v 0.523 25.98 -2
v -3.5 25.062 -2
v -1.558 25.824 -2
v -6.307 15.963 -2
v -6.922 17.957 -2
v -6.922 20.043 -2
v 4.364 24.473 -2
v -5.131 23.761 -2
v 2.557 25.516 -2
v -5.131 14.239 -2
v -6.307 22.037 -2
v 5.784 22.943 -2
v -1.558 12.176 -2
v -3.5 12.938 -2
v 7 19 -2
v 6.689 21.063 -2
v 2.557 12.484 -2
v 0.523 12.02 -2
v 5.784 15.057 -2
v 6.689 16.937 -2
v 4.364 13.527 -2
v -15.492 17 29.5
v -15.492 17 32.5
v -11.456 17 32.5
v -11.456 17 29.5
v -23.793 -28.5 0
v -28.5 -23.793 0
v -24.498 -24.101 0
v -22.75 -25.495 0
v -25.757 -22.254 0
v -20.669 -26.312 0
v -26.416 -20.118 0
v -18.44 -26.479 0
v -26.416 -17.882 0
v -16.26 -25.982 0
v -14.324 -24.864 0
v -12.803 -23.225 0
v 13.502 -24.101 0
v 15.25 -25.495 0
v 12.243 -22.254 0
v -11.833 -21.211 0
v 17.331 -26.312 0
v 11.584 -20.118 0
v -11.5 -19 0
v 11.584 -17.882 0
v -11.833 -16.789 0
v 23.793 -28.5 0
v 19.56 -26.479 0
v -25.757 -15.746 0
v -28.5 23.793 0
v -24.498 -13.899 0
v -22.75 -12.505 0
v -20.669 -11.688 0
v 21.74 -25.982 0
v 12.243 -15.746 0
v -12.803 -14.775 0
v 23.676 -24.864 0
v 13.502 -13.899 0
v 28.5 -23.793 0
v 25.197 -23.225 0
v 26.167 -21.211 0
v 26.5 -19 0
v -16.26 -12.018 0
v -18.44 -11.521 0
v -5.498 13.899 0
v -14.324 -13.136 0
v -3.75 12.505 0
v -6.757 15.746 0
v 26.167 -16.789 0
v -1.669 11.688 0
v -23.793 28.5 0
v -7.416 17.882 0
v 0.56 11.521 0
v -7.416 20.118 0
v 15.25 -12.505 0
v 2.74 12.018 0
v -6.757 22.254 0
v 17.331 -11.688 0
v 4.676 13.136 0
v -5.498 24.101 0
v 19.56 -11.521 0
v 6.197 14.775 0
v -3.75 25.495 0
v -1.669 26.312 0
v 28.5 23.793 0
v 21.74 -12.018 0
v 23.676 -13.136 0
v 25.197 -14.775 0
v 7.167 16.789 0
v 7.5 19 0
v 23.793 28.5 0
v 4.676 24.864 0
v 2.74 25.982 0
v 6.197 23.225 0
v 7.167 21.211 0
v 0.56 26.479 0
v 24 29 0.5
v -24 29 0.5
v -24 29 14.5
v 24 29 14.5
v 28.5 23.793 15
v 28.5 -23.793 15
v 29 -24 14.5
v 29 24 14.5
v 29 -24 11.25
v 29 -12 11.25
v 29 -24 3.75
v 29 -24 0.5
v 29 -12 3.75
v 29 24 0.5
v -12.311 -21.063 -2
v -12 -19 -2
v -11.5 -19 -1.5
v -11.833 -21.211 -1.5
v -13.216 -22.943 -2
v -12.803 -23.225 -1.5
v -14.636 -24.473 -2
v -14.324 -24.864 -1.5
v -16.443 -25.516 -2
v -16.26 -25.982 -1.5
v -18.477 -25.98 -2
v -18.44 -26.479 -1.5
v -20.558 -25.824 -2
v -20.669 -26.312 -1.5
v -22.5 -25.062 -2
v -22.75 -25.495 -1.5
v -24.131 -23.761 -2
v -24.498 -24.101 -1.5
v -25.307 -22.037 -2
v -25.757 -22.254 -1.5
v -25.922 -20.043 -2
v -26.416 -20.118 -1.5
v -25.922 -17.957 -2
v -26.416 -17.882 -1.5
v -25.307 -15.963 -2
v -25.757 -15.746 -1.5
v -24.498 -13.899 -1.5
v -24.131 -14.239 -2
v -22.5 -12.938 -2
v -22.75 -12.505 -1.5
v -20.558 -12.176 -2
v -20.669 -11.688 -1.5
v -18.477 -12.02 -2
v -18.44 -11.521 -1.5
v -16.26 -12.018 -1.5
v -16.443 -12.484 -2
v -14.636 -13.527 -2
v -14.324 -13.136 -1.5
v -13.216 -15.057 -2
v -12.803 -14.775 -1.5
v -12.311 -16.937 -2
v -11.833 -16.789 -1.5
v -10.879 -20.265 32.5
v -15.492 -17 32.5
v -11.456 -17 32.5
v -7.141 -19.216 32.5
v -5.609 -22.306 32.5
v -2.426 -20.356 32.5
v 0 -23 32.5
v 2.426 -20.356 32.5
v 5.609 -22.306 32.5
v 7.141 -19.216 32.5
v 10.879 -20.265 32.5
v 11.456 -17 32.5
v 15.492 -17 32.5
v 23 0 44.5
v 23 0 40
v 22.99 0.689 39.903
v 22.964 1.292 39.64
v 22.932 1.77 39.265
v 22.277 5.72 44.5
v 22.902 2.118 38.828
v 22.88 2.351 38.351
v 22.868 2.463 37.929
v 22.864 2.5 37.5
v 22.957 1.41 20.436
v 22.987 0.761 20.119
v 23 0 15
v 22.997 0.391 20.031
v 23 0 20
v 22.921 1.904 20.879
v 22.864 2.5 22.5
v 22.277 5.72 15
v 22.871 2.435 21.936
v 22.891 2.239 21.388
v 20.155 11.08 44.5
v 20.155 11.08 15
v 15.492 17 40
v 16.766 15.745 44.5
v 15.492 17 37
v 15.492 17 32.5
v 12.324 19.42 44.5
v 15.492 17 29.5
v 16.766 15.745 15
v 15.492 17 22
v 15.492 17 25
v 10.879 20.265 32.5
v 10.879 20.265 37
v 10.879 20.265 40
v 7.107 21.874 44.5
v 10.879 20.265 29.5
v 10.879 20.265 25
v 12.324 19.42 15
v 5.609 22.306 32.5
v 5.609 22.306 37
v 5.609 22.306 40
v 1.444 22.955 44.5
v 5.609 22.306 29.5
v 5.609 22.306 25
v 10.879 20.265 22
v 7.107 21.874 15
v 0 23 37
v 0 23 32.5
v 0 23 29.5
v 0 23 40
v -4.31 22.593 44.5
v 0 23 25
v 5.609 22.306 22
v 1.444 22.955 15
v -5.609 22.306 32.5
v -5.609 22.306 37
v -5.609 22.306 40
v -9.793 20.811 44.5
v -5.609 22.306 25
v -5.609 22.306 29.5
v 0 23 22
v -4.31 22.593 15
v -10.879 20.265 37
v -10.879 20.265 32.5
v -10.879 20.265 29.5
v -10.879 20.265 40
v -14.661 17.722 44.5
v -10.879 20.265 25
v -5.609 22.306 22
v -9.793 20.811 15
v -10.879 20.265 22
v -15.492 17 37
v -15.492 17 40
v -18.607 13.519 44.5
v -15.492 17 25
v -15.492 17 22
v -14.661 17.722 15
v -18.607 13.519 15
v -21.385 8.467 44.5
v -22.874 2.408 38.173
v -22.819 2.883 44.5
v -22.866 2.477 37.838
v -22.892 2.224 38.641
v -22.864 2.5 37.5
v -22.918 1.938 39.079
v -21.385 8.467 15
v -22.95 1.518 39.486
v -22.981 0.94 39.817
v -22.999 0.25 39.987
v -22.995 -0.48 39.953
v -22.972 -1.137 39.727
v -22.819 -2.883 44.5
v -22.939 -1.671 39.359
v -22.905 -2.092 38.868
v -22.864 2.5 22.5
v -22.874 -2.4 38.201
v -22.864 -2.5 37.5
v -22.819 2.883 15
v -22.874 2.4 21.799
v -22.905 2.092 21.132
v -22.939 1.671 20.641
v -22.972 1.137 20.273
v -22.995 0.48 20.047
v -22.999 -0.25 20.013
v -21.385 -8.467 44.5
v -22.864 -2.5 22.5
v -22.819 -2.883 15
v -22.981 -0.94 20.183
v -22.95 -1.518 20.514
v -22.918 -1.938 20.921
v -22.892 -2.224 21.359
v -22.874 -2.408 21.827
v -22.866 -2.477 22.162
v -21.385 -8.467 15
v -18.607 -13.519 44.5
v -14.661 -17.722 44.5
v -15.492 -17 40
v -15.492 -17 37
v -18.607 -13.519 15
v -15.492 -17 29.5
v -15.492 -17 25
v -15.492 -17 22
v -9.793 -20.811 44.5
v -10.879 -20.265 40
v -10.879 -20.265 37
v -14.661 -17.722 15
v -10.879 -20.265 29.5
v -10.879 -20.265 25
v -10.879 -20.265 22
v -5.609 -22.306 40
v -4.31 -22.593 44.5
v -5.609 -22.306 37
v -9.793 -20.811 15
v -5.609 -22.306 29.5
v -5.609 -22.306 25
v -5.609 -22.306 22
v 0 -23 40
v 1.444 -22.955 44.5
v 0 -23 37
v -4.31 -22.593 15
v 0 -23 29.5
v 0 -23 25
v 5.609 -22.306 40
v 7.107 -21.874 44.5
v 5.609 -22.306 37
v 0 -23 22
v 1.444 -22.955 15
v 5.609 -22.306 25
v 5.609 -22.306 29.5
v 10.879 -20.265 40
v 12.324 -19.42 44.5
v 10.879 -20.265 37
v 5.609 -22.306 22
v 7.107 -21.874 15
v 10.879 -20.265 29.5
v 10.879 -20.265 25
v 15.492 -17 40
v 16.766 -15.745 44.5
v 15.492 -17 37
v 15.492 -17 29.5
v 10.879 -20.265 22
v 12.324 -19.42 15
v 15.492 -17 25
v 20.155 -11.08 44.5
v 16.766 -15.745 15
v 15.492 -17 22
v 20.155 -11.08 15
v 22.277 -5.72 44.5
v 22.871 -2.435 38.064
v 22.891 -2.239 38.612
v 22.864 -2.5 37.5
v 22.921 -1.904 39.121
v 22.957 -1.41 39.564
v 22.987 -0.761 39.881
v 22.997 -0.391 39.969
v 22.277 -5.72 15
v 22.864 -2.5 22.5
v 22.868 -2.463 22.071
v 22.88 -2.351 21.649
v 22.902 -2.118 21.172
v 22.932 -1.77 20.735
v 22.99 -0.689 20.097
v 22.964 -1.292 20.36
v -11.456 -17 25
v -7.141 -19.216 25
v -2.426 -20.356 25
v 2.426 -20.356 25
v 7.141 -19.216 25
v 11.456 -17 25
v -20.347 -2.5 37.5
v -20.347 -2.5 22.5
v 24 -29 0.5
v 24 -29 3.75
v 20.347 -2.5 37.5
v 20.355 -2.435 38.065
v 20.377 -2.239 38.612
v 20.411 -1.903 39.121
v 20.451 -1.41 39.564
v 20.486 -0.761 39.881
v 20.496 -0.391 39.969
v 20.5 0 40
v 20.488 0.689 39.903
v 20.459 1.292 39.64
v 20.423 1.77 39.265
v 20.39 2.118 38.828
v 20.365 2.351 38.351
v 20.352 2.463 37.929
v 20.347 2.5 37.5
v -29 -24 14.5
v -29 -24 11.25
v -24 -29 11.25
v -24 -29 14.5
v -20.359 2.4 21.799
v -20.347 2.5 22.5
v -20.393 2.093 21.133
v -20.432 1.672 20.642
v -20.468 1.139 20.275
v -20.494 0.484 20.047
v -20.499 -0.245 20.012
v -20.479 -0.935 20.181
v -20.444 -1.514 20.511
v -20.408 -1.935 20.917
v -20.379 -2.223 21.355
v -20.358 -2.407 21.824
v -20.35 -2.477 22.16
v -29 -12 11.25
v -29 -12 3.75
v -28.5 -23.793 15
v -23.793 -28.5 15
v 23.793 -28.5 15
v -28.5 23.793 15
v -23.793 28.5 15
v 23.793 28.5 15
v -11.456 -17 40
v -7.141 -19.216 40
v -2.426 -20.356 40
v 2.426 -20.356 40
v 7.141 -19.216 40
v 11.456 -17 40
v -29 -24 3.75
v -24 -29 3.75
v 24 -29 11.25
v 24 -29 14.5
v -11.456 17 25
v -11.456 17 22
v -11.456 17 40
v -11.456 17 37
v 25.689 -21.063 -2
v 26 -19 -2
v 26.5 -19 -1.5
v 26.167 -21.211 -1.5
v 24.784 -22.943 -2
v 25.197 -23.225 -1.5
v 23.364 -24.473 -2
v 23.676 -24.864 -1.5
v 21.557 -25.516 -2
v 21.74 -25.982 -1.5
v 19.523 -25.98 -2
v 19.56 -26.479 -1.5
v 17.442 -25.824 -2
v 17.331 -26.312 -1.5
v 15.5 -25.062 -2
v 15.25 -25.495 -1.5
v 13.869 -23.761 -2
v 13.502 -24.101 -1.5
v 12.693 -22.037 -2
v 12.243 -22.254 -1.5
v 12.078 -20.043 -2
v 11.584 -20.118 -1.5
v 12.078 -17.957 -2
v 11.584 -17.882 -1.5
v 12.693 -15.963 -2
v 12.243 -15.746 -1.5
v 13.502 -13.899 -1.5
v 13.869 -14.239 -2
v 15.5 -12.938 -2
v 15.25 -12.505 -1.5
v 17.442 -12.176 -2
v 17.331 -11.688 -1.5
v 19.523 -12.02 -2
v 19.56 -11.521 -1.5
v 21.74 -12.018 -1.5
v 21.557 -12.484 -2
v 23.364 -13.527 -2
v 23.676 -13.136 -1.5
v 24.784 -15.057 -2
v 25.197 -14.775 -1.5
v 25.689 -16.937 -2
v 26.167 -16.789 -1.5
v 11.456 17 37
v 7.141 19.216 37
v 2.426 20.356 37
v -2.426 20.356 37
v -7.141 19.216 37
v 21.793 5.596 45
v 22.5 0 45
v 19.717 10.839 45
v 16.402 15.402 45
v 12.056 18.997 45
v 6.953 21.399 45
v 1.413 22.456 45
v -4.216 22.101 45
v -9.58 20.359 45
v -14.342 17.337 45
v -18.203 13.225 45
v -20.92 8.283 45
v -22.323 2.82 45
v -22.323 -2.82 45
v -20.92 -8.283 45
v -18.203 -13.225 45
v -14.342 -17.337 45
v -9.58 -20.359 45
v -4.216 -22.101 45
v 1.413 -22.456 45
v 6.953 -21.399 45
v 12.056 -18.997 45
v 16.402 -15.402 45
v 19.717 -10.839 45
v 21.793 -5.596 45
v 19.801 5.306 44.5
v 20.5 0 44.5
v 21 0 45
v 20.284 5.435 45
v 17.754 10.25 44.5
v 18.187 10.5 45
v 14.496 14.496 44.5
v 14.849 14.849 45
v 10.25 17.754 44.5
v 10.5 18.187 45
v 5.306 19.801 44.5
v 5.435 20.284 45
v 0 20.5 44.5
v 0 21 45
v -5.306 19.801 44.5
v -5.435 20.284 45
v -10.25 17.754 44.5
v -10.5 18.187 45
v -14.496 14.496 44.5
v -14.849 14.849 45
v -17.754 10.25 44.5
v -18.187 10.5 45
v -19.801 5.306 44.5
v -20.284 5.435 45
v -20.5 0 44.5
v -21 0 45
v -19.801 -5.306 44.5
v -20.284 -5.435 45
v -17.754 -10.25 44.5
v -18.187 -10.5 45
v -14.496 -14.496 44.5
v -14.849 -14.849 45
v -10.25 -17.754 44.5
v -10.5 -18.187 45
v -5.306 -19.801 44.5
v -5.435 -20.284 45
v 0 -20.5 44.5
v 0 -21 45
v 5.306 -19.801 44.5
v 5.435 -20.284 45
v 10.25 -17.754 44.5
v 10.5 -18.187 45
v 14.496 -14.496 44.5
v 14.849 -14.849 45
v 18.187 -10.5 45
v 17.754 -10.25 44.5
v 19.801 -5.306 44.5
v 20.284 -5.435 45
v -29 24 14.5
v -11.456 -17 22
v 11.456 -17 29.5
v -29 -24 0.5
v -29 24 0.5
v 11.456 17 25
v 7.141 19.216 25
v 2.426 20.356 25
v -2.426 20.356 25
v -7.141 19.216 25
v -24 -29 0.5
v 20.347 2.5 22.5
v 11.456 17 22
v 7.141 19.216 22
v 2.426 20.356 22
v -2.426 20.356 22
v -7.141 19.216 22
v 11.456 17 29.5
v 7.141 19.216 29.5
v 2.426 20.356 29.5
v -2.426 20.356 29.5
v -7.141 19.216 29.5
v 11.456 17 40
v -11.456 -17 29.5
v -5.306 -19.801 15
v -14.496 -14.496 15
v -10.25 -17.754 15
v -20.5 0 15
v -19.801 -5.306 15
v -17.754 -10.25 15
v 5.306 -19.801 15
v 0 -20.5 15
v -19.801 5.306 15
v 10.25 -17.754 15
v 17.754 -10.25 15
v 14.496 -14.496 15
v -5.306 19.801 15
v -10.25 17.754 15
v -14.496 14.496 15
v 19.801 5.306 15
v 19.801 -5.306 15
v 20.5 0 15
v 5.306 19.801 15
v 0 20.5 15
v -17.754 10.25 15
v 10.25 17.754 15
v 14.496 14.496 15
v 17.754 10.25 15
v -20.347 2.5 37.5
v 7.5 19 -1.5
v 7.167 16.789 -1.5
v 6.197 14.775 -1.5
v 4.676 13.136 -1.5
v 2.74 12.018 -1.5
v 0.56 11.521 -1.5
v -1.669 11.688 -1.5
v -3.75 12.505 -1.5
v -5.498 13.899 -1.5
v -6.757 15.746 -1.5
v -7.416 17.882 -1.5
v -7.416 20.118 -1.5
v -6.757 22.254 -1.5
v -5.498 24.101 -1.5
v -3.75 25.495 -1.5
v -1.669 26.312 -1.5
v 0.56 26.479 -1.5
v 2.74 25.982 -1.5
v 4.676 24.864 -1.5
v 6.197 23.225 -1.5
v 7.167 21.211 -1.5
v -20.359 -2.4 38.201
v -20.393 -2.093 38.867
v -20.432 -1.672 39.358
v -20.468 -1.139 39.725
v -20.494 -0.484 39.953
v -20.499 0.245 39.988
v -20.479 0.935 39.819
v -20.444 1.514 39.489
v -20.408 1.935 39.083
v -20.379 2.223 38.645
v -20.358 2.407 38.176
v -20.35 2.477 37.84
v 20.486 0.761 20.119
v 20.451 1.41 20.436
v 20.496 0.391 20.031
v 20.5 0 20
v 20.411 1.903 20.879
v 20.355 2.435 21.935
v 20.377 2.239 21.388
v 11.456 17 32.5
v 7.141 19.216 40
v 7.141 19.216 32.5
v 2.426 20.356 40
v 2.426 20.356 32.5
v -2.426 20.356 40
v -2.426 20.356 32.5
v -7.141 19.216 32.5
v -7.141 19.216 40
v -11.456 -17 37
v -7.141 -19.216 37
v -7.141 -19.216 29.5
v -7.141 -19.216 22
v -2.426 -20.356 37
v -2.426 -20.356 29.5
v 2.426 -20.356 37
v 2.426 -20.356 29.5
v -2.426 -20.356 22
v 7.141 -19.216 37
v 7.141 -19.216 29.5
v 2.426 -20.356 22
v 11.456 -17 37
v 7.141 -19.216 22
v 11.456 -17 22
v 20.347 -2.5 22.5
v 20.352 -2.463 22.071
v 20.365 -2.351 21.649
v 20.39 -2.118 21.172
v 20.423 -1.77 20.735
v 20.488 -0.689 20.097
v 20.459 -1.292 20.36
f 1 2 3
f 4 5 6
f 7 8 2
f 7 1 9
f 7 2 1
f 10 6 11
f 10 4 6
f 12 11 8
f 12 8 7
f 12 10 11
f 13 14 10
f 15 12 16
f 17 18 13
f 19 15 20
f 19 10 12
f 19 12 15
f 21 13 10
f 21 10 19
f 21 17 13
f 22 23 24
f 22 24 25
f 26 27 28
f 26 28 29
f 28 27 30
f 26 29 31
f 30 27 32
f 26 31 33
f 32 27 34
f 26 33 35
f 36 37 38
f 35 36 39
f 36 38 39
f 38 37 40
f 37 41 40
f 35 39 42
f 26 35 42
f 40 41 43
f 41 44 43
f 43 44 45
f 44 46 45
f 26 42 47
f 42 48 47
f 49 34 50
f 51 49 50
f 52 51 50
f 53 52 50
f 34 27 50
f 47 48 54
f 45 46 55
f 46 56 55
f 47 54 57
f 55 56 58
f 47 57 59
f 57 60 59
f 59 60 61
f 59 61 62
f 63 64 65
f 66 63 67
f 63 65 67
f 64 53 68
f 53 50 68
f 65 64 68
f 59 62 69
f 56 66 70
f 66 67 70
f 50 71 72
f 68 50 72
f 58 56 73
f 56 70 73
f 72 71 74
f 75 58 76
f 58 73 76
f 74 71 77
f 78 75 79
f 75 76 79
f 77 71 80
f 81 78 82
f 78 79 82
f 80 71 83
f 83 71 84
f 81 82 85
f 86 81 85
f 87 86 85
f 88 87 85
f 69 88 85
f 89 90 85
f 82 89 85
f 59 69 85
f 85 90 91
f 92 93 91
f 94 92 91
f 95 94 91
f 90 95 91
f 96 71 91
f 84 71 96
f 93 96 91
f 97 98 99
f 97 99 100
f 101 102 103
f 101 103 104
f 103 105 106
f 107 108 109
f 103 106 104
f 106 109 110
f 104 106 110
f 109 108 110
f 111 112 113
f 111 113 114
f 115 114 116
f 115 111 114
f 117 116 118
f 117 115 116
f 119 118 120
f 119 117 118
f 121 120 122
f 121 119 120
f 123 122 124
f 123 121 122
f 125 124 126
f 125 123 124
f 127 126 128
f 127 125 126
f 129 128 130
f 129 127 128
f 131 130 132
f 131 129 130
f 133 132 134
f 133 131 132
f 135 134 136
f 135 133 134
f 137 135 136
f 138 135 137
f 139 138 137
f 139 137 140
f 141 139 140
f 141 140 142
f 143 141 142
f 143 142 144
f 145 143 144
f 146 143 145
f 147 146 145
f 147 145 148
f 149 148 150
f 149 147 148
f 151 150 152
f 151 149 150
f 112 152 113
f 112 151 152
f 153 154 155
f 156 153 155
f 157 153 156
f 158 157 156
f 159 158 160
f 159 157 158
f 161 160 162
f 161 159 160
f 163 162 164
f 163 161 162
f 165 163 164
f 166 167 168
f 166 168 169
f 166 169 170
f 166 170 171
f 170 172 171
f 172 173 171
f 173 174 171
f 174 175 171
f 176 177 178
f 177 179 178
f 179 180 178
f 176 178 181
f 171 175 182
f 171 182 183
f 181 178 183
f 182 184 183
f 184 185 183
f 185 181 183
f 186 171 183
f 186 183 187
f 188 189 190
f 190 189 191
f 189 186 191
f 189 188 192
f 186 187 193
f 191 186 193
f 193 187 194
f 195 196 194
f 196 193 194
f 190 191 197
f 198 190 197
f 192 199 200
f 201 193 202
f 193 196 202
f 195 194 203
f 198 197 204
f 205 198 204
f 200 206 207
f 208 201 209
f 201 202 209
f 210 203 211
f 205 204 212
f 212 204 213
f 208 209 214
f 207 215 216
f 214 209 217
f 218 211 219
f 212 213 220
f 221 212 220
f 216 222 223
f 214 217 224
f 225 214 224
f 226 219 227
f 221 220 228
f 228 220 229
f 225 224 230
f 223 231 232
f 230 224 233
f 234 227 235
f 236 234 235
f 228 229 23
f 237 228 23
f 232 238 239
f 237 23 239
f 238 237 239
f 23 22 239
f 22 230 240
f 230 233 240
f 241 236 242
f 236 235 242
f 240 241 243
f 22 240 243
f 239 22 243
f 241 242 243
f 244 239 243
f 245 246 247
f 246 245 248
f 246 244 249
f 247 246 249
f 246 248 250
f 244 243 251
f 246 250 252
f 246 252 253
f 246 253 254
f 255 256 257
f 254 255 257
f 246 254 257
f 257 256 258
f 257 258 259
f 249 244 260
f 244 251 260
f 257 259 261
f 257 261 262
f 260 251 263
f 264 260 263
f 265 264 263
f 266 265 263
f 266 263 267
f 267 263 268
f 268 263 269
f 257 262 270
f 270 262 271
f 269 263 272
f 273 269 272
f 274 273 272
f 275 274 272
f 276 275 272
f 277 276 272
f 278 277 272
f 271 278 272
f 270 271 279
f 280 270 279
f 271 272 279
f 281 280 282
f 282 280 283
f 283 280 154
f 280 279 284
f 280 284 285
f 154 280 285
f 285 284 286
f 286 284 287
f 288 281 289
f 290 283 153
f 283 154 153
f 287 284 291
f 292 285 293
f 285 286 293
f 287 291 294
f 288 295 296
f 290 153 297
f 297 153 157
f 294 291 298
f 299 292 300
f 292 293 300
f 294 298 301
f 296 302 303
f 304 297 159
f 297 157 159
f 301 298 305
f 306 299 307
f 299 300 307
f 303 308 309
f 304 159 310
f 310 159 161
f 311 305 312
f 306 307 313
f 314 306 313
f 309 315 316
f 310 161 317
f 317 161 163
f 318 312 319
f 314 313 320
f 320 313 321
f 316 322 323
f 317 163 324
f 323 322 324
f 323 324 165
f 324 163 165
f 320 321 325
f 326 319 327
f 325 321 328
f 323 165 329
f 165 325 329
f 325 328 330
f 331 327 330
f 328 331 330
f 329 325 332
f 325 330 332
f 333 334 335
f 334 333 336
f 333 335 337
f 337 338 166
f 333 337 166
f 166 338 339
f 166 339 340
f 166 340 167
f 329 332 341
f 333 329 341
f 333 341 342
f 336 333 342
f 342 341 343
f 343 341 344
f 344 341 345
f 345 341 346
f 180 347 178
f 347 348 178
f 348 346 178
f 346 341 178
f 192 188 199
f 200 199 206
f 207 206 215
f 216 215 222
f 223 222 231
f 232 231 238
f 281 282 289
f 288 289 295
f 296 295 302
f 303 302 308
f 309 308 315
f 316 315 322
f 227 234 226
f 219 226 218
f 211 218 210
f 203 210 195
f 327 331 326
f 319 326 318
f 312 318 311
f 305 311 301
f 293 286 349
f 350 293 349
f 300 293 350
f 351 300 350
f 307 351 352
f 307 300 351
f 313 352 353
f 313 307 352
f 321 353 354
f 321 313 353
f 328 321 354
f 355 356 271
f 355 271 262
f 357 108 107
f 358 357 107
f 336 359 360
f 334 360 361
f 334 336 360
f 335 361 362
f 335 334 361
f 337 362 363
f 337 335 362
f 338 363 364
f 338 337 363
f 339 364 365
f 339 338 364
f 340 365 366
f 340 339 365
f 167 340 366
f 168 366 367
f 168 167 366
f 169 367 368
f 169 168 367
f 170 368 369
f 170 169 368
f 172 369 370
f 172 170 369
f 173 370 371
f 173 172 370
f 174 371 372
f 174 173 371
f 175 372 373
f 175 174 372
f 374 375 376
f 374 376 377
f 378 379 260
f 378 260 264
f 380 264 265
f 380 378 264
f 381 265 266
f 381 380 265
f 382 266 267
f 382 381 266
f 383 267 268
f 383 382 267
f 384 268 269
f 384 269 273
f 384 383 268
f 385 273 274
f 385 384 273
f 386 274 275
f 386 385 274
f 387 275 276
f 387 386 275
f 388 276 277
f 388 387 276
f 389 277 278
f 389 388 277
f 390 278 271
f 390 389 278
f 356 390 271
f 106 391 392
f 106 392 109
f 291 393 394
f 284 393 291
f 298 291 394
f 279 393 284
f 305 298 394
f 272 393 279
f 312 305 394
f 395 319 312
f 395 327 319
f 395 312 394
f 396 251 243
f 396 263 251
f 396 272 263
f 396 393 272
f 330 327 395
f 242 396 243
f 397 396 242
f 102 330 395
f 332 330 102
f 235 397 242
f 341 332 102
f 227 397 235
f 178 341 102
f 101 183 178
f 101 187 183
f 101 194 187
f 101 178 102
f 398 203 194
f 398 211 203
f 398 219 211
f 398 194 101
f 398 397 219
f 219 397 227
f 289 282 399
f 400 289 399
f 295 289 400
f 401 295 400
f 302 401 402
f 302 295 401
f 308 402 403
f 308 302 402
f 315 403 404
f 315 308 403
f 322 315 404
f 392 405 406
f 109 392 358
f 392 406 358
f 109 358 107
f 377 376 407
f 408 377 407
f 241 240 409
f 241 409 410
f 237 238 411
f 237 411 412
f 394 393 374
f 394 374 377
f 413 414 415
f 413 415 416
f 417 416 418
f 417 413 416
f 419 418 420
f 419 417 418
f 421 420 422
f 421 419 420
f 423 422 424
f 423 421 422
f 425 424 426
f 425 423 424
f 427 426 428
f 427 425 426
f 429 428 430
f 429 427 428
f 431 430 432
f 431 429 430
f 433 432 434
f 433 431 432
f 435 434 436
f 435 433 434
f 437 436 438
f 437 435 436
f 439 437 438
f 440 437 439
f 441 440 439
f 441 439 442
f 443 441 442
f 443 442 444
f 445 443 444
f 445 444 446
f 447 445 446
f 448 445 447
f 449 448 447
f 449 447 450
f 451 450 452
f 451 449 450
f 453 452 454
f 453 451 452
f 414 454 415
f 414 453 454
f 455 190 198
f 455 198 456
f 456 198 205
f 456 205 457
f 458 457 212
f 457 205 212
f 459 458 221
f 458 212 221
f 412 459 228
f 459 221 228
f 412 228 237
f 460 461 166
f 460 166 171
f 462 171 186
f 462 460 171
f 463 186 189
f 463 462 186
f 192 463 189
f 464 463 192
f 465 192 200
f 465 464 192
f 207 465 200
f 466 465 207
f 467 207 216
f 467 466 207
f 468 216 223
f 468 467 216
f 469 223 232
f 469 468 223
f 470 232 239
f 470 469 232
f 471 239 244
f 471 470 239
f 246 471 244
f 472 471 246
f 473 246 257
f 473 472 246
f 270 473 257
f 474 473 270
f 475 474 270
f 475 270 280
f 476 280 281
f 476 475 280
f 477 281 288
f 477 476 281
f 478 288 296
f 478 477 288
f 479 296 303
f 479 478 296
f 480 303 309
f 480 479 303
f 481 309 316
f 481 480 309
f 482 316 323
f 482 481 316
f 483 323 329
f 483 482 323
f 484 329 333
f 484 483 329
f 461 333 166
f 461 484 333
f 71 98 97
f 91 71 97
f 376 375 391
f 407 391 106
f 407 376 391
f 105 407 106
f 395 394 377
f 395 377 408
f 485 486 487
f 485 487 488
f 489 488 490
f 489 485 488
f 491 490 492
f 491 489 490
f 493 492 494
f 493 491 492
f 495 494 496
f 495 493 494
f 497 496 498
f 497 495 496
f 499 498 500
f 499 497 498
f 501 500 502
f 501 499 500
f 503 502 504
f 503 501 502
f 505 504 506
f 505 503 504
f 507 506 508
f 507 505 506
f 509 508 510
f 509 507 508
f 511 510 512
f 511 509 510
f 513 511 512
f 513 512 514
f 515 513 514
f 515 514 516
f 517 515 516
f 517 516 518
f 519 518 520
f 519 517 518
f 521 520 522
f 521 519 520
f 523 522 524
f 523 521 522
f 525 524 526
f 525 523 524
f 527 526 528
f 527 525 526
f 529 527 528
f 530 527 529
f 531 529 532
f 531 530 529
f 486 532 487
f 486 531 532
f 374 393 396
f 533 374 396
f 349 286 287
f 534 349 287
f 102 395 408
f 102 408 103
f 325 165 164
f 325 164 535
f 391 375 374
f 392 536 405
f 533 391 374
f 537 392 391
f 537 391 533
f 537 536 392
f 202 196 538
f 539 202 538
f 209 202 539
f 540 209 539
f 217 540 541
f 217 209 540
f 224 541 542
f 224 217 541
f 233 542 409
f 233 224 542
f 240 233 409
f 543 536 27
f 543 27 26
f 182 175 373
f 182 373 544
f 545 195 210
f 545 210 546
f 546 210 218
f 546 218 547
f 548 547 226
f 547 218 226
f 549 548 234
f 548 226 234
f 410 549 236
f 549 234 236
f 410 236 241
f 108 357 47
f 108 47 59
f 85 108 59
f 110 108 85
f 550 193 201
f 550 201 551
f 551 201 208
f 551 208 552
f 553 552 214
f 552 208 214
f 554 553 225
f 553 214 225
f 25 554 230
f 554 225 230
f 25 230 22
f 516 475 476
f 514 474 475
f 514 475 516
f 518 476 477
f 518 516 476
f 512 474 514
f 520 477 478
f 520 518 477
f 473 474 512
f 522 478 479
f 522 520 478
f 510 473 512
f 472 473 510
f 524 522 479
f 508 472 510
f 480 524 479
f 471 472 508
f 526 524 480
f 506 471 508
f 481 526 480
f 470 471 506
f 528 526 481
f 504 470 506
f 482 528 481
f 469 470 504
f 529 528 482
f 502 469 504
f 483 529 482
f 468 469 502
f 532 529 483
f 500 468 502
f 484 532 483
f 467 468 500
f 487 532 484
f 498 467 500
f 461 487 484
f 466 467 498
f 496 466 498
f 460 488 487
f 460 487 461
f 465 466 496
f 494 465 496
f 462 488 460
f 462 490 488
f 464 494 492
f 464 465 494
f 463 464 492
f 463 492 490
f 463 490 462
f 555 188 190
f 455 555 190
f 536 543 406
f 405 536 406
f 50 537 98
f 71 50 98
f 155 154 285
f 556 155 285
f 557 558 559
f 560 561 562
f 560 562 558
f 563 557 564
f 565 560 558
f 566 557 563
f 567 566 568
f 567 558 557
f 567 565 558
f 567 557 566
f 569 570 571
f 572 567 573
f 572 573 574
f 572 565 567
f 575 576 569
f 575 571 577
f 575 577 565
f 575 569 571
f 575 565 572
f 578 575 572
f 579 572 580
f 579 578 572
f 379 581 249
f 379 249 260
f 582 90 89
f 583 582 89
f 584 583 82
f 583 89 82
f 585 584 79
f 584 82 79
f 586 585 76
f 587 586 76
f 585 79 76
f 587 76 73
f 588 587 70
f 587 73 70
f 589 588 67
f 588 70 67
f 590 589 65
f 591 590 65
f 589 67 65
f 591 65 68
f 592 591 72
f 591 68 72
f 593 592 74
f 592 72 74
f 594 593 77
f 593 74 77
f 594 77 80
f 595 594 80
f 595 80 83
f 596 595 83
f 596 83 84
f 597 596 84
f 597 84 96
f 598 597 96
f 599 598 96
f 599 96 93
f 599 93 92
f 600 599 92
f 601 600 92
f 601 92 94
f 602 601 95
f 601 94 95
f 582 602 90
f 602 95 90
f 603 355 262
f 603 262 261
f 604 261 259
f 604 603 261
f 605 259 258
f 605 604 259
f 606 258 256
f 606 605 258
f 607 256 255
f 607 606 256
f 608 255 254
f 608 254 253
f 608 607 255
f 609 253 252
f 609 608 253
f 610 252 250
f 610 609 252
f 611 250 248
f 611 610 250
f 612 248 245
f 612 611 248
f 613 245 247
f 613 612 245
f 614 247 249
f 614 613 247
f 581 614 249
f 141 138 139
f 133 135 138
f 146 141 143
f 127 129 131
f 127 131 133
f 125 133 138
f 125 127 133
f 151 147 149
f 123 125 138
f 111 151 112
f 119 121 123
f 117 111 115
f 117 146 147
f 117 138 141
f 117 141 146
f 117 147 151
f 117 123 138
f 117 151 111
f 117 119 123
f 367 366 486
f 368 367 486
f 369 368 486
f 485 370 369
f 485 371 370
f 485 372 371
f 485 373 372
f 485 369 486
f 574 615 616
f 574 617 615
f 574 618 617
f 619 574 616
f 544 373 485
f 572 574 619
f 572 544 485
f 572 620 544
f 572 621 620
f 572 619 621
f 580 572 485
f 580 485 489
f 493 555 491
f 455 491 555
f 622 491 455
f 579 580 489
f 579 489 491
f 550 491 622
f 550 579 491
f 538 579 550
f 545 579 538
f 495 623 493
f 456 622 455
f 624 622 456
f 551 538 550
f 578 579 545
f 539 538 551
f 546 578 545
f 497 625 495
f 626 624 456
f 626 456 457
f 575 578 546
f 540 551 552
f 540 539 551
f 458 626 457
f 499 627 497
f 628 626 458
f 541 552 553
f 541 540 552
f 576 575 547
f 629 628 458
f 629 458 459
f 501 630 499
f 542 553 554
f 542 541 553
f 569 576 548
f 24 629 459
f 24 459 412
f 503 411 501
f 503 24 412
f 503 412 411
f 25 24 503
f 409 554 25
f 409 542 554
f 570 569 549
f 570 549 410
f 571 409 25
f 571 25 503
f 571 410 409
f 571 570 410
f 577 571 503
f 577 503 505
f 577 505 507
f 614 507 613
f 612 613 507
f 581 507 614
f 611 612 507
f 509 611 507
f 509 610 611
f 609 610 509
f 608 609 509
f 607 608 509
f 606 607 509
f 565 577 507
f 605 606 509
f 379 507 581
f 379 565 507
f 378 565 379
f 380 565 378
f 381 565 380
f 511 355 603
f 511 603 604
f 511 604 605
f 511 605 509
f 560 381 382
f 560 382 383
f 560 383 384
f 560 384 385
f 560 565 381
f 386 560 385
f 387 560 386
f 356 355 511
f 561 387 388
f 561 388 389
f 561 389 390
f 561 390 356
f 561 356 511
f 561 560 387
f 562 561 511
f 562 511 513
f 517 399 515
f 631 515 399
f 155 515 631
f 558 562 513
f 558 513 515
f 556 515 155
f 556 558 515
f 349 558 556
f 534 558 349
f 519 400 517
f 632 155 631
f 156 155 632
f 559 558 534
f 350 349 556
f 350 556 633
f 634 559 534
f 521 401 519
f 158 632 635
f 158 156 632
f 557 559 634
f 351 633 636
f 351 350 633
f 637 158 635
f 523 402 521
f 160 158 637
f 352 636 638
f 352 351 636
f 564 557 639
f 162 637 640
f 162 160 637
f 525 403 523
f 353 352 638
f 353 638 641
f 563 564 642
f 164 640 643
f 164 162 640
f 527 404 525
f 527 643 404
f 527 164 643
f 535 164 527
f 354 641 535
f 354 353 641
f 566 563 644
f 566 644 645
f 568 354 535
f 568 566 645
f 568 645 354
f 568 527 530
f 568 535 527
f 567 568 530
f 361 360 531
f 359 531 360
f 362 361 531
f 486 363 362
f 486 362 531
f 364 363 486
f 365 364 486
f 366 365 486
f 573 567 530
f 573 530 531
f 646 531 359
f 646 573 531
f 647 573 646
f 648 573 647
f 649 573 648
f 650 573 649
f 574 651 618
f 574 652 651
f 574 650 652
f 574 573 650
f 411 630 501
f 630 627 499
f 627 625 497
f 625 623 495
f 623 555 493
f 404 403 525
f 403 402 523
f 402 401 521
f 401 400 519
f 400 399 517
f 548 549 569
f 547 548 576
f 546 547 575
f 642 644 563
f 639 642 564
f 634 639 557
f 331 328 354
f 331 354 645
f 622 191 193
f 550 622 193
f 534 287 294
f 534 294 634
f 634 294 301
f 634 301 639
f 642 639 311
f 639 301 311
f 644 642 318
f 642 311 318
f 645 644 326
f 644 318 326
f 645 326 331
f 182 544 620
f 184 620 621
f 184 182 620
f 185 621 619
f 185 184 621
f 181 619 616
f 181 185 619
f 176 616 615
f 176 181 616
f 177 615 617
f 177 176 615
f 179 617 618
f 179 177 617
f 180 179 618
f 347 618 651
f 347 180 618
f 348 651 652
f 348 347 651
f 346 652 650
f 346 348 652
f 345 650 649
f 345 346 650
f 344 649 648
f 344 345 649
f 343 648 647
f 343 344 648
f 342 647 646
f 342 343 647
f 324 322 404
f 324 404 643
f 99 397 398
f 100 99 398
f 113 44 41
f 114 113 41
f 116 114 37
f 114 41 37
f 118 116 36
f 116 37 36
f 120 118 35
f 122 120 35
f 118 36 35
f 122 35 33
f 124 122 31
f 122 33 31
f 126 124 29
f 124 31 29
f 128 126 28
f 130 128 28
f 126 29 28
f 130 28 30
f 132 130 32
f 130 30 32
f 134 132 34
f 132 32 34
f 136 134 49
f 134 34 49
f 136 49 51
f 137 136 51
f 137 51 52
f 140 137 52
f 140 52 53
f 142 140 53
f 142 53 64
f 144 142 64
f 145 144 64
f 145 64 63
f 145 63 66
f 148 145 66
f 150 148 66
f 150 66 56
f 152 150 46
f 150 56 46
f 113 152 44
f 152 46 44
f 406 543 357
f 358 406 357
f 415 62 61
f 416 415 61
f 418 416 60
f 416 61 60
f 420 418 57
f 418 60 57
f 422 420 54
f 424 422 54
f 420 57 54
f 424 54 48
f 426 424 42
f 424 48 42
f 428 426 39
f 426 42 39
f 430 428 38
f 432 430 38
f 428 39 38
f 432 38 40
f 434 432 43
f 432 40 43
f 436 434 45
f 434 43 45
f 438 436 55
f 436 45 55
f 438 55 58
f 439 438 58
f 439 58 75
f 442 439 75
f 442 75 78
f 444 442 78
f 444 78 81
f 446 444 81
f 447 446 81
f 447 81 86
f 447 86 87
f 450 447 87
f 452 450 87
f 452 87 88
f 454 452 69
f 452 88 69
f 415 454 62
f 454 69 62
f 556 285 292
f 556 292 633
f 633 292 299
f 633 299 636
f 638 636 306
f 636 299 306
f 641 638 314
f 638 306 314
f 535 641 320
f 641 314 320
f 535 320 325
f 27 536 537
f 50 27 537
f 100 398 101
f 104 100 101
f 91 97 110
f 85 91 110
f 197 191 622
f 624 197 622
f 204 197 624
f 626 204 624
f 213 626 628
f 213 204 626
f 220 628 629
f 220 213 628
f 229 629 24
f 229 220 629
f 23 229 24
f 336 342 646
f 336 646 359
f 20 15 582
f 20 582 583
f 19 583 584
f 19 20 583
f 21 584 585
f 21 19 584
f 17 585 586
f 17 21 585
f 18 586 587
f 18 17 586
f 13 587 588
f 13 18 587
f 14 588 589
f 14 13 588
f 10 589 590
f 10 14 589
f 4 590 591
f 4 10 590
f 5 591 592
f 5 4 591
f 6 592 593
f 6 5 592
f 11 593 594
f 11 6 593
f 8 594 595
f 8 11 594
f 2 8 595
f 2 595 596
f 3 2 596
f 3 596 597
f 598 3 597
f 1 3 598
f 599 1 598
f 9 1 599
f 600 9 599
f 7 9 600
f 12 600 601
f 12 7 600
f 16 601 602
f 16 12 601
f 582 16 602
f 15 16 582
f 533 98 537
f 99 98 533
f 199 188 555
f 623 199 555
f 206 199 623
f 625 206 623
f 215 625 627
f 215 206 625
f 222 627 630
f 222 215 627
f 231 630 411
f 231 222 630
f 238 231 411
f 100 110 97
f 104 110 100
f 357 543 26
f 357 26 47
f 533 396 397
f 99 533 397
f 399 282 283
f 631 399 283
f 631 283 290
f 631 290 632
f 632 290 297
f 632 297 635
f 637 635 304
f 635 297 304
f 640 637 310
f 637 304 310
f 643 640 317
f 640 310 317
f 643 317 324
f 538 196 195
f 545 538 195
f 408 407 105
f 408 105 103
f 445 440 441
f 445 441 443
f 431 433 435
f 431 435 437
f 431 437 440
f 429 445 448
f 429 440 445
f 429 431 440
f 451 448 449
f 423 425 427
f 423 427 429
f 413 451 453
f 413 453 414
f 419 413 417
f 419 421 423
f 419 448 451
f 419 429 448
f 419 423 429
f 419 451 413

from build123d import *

# Parameters (mm, degrees)
SKIZZE3_W                       = 58
SKIZZE3_H                       = 58
AUFSATZ_LINEAR_AUSTRAGEN1_DEPTH = 15
SKIZZE4_R                       = 7.5
AUFSATZ_LINEAR_AUSTRAGEN2_DEPTH = 2
FASE1_SIZE                      = 5
SKIZZE5_R                       = 23
SKIZZE5_R_2                     = 20.5
AUFSATZ_LINEAR_AUSTRAGEN3_DEPTH = 30
SKIZZE6_W                       = 3
SKIZZE6_H                       = 39.520504732
SCHNITT_LINEAR_AUSTRAGEN1_DEPTH = 6
SKIZZE7_W                       = 3
SKIZZE7_H                       = 35.12933754
SCHNITT_LINEAR_AUSTRAGEN2_DEPTH = 6
SCHNITT_LINEAR_AUSTRAGEN3_DEPTH = 53
FASE2_SIZE                      = 0.5
FASE3_SIZE                      = 0.5
SKIZZE10_W                      = 58.775237502
SKIZZE10_H                      = 7.5
SCHNITT_LINEAR_AUSTRAGEN5_DEPTH = 17


with BuildPart() as part:
    # Skizze3 → Aufsatz-Linear austragen1 (new body)
    with BuildSketch(Plane.XY):
        Rectangle(SKIZZE3_W, SKIZZE3_H)
    extrude(amount=AUFSATZ_LINEAR_AUSTRAGEN1_DEPTH)

    # Skizze4 → Aufsatz-Linear austragen2 (add)
    with BuildSketch(Plane(origin=(0, 0, 0), x_dir=(-1, 0, 0), z_dir=(0, 0, -1))):
        with Locations(Location((0, 19, 0), (0, 0, 180))):  # turned: the seam where the file's is
            Circle(SKIZZE4_R)
        with Locations(Location((19, -19, 0), (0, 0, 180))):  # turned: the seam where the file's is
            Circle(SKIZZE4_R)
        with Locations(Location((-19, -19, 0), (0, 0, 180))):  # turned: the seam where the file's is
            Circle(SKIZZE4_R)
    extrude(amount=AUFSATZ_LINEAR_AUSTRAGEN2_DEPTH)

    # Fase1
    fase1_edges = [part.edges().sort_by_distance(p)[0] for p in [
        (29, -29, 7.5),
        (-29, -29, 7.5),
        (-29, 29, 7.5),
        (29, 29, 7.5),
    ]]
    chamfer(fase1_edges, length=FASE1_SIZE)

    # Skizze5 → Aufsatz-Linear austragen3 (add)
    with BuildSketch(Plane.XY.offset(15)):
        Circle(SKIZZE5_R)
        Circle(SKIZZE5_R_2, mode=Mode.SUBTRACT)
    extrude(amount=AUFSATZ_LINEAR_AUSTRAGEN3_DEPTH)

    # Skizze6 → Schnitt-Linear austragen1 (cut)
    with BuildSketch(Plane(origin=(0, -23, 0), x_dir=(0, 0, -1), z_dir=(0, -1, 0))):
        with Locations((-23.5, 0)):
            Rectangle(SKIZZE6_W, SKIZZE6_H)
        with Locations((-31, 0)):
            Rectangle(SKIZZE6_W, SKIZZE6_H)
        with Locations((-38.5, 0)):
            Rectangle(SKIZZE6_W, SKIZZE6_H)
    extrude(amount=-SCHNITT_LINEAR_AUSTRAGEN1_DEPTH, mode=Mode.SUBTRACT)

    # Skizze7 → Schnitt-Linear austragen2 (cut)
    with BuildSketch(Plane(origin=(0, 23, 0), x_dir=(0, 0, -1), z_dir=(0, 1, 0))):
        with Locations((-23.5, 0)):
            Rectangle(SKIZZE7_W, SKIZZE7_H)
        with Locations((-31, 0)):
            Rectangle(SKIZZE7_W, SKIZZE7_H)
        with Locations((-38.5, 0)):
            Rectangle(SKIZZE7_W, SKIZZE7_H)
    extrude(amount=-SCHNITT_LINEAR_AUSTRAGEN2_DEPTH, mode=Mode.SUBTRACT)

    # Skizze8 → Schnitt-Linear austragen3 (cut, through all)
    with BuildSketch(Plane(origin=(23, 0, 0), x_dir=(0, 0, -1), z_dir=(1, 0, 0))):
        with BuildLine():
            Line((-37.5, 2.5), (-22.5, 2.5))
            ThreePointArc((-22.5, 2.5), (-20, 0), (-22.5, -2.5))
            Line((-22.5, -2.5), (-37.5, -2.5))
            ThreePointArc((-37.5, -2.5), (-40, 0), (-37.5, 2.5))
        make_face()
    extrude(amount=-SCHNITT_LINEAR_AUSTRAGEN3_DEPTH, mode=Mode.SUBTRACT)

    # Fase2
    fase2_edges = [part.edges().sort_by_distance(p)[0] for p in [
        (-7.5, 19, -2),
        (-26.5, -19, -2),
        (11.5, -19, -2),
        (-23, 0, 45),
        (-20.5, 0, 45),
    ]]
    chamfer(fase2_edges, length=FASE2_SIZE)

    # Fase3
    fase3_edges = [part.edges().sort_by_distance(p)[0] for p in [
        (0, -29, 0),
        (0, -29, 15),
        (29, 0, 0),
        (-29, 0, 0),
        (0, 29, 0),
        (-26.5, 26.5, 0),
        (26.5, 26.5, 0),
        (26.5, -26.5, 0),
        (-26.5, -26.5, 0),
        (-29, 0, 15),
        (29, 0, 15),
        (0, 29, 15),
        (-26.5, 26.5, 15),
        (26.5, 26.5, 15),
        (26.5, -26.5, 15),
        (-26.5, -26.5, 15),
    ]]
    chamfer(fase3_edges, length=FASE3_SIZE)

    # Skizze10 → Schnitt-Linear austragen5 (cut)
    with BuildSketch(Plane.XZ.offset(29)):
        with Locations((0, 7.5)):
            Rectangle(SKIZZE10_W, SKIZZE10_H)
    extrude(amount=-SCHNITT_LINEAR_AUSTRAGEN5_DEPTH, mode=Mode.SUBTRACT)


solid = part.part
